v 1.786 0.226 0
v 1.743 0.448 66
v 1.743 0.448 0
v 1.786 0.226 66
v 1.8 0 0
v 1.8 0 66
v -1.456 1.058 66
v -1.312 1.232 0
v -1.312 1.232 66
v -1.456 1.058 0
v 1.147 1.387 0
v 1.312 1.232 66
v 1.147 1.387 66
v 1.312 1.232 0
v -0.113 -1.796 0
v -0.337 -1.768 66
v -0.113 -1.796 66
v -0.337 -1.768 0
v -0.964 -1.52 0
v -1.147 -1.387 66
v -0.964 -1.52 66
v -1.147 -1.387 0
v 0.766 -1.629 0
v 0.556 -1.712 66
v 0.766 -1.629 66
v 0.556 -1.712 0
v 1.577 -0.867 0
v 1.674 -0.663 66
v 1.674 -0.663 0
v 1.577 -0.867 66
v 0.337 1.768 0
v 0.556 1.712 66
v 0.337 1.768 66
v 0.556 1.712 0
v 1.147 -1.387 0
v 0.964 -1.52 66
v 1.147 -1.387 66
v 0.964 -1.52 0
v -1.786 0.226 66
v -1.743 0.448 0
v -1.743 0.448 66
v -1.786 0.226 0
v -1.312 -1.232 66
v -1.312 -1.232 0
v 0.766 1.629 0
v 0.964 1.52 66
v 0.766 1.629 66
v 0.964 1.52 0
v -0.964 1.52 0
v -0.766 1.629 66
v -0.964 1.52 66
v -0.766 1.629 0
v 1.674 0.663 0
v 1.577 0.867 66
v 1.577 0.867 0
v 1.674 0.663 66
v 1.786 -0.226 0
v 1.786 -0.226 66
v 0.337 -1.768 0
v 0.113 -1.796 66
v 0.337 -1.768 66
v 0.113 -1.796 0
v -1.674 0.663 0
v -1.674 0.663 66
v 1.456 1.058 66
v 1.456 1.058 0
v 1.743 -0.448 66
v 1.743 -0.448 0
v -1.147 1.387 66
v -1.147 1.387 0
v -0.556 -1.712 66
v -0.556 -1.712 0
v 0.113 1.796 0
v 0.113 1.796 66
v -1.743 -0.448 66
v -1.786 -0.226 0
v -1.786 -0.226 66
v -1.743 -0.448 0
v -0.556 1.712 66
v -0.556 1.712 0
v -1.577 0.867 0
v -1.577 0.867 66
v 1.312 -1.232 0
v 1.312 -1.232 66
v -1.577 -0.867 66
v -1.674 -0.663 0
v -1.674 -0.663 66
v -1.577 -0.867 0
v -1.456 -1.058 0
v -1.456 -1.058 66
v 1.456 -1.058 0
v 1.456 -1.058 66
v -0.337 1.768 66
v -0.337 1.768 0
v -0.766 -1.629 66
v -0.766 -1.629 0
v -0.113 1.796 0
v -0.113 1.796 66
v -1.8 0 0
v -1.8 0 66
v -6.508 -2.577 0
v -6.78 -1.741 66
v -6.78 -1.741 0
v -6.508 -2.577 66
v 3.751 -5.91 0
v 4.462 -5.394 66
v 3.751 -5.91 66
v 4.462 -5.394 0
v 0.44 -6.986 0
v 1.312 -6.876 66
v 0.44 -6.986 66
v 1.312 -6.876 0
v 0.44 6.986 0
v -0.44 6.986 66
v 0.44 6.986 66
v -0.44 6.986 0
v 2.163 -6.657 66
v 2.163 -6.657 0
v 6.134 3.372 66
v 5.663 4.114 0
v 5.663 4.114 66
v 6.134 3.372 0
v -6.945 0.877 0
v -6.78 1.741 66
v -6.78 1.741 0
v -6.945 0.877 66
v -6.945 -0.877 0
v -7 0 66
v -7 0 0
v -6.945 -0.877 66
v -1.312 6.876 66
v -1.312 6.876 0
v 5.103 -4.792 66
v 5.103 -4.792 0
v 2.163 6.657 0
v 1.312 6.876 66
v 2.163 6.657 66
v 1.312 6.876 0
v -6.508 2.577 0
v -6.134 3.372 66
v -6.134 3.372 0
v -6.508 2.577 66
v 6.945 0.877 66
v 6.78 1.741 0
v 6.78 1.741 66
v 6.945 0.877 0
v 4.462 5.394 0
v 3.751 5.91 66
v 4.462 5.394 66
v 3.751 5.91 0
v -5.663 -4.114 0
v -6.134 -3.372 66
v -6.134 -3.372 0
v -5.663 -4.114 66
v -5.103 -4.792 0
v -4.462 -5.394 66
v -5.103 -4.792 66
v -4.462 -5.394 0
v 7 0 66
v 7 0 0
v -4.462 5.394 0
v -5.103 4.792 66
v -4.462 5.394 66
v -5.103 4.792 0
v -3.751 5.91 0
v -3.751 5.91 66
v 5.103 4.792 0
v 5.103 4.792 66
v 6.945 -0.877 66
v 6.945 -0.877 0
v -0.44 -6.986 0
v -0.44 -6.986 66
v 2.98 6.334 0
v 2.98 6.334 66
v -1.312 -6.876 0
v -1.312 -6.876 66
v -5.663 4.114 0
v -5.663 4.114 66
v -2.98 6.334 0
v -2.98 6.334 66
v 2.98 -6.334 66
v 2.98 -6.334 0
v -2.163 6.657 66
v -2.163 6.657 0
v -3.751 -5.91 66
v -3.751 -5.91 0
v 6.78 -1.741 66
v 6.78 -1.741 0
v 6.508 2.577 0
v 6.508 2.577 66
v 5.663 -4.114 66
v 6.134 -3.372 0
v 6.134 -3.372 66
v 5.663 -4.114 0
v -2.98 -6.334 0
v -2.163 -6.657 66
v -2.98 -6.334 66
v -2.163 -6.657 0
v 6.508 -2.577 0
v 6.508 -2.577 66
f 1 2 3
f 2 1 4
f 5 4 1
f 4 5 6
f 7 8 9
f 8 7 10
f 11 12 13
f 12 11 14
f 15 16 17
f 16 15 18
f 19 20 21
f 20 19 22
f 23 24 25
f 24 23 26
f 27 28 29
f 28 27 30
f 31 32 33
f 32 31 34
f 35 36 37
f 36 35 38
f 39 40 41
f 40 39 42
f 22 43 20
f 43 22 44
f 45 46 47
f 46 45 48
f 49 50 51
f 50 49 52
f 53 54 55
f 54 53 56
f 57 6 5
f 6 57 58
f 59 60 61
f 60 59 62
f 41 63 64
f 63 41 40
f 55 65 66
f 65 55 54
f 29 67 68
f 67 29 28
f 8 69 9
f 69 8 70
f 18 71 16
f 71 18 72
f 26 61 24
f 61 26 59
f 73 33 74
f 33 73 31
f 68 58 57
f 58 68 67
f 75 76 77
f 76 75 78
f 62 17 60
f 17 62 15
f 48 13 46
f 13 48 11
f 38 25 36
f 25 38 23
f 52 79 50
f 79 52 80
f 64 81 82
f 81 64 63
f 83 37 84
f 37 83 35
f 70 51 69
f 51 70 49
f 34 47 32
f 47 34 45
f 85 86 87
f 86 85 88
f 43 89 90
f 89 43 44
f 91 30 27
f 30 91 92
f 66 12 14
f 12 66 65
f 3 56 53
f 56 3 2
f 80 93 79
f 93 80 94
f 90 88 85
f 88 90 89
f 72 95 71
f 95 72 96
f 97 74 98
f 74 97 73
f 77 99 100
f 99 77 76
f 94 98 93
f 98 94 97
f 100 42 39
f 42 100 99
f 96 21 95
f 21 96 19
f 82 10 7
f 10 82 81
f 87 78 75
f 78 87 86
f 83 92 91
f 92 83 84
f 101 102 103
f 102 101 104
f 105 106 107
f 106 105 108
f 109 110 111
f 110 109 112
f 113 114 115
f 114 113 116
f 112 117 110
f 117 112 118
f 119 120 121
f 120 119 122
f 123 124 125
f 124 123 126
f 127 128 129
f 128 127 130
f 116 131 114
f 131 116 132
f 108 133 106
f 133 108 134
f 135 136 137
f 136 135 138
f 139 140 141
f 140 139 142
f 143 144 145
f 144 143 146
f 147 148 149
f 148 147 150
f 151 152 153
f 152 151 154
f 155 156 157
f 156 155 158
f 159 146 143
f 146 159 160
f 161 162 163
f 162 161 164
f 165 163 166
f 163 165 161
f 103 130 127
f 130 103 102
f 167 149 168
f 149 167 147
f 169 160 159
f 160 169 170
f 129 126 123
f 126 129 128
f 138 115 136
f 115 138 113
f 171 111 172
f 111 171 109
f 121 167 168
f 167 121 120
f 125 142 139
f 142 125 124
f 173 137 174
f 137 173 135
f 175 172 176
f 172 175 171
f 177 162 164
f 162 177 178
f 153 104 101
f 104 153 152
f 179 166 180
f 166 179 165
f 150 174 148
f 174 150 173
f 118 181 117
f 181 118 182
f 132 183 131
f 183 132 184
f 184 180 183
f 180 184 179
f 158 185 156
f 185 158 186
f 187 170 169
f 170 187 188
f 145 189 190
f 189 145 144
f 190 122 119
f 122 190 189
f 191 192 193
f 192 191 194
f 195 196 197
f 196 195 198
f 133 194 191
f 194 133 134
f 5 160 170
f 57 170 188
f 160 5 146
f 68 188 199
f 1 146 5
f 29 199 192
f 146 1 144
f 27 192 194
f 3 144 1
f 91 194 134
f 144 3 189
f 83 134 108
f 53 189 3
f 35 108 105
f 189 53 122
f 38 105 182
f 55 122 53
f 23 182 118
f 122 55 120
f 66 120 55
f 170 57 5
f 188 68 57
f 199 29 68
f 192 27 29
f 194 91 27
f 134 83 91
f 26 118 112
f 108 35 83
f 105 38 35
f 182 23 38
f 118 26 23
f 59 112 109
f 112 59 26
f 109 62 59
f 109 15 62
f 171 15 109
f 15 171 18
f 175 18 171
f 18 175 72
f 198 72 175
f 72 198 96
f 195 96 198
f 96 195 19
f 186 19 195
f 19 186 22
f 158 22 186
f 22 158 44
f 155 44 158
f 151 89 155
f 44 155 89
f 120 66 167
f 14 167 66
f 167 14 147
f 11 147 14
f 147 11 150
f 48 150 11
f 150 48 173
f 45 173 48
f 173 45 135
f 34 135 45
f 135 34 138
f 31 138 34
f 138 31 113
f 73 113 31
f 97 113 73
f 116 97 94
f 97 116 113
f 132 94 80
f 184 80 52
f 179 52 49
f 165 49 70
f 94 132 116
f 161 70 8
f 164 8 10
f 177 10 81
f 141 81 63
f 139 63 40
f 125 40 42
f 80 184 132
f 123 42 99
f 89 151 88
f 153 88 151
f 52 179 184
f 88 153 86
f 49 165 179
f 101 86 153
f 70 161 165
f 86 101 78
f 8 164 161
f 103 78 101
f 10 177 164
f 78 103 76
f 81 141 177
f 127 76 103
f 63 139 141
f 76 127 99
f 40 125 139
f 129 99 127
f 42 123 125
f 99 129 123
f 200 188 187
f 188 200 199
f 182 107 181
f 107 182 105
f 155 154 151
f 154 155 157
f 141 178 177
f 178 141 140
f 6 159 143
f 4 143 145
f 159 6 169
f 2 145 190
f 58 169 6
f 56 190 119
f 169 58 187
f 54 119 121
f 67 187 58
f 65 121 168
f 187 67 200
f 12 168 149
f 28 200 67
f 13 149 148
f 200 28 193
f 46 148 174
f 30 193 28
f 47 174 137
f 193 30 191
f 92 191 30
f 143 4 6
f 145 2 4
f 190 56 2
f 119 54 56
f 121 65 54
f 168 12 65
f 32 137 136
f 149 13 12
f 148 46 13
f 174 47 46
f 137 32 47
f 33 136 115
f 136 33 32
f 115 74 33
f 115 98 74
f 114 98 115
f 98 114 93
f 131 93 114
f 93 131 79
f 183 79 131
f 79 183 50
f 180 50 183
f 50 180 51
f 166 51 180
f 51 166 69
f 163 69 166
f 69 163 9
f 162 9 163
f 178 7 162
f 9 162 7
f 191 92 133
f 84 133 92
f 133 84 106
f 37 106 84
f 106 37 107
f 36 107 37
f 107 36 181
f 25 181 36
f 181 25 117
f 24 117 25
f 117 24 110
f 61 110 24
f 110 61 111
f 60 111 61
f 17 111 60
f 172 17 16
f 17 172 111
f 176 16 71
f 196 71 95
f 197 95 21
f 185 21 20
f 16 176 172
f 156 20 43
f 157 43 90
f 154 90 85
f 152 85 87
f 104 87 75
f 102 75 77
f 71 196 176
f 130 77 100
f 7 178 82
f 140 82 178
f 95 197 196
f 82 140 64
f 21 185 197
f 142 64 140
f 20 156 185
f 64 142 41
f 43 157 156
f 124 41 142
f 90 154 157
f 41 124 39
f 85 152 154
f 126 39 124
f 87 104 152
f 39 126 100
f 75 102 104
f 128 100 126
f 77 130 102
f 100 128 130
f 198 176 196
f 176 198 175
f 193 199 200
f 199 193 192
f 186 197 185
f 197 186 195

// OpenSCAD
$fn = 50;


difference() {
	union() {
		cylinder(h = 66, r = 7.0000000000);
	}
	union() {
		translate(v = [0.0000000000, 0.0000000000, -100.0000000000]) {
			cylinder(h = 200, r = 1.8000000000);
		}
		cylinder(h = 66, r = 1.8000000000);
		cylinder(h = 66, r = 1.8000000000);
		cylinder(h = 66, r = 1.8000000000);
	}
}
